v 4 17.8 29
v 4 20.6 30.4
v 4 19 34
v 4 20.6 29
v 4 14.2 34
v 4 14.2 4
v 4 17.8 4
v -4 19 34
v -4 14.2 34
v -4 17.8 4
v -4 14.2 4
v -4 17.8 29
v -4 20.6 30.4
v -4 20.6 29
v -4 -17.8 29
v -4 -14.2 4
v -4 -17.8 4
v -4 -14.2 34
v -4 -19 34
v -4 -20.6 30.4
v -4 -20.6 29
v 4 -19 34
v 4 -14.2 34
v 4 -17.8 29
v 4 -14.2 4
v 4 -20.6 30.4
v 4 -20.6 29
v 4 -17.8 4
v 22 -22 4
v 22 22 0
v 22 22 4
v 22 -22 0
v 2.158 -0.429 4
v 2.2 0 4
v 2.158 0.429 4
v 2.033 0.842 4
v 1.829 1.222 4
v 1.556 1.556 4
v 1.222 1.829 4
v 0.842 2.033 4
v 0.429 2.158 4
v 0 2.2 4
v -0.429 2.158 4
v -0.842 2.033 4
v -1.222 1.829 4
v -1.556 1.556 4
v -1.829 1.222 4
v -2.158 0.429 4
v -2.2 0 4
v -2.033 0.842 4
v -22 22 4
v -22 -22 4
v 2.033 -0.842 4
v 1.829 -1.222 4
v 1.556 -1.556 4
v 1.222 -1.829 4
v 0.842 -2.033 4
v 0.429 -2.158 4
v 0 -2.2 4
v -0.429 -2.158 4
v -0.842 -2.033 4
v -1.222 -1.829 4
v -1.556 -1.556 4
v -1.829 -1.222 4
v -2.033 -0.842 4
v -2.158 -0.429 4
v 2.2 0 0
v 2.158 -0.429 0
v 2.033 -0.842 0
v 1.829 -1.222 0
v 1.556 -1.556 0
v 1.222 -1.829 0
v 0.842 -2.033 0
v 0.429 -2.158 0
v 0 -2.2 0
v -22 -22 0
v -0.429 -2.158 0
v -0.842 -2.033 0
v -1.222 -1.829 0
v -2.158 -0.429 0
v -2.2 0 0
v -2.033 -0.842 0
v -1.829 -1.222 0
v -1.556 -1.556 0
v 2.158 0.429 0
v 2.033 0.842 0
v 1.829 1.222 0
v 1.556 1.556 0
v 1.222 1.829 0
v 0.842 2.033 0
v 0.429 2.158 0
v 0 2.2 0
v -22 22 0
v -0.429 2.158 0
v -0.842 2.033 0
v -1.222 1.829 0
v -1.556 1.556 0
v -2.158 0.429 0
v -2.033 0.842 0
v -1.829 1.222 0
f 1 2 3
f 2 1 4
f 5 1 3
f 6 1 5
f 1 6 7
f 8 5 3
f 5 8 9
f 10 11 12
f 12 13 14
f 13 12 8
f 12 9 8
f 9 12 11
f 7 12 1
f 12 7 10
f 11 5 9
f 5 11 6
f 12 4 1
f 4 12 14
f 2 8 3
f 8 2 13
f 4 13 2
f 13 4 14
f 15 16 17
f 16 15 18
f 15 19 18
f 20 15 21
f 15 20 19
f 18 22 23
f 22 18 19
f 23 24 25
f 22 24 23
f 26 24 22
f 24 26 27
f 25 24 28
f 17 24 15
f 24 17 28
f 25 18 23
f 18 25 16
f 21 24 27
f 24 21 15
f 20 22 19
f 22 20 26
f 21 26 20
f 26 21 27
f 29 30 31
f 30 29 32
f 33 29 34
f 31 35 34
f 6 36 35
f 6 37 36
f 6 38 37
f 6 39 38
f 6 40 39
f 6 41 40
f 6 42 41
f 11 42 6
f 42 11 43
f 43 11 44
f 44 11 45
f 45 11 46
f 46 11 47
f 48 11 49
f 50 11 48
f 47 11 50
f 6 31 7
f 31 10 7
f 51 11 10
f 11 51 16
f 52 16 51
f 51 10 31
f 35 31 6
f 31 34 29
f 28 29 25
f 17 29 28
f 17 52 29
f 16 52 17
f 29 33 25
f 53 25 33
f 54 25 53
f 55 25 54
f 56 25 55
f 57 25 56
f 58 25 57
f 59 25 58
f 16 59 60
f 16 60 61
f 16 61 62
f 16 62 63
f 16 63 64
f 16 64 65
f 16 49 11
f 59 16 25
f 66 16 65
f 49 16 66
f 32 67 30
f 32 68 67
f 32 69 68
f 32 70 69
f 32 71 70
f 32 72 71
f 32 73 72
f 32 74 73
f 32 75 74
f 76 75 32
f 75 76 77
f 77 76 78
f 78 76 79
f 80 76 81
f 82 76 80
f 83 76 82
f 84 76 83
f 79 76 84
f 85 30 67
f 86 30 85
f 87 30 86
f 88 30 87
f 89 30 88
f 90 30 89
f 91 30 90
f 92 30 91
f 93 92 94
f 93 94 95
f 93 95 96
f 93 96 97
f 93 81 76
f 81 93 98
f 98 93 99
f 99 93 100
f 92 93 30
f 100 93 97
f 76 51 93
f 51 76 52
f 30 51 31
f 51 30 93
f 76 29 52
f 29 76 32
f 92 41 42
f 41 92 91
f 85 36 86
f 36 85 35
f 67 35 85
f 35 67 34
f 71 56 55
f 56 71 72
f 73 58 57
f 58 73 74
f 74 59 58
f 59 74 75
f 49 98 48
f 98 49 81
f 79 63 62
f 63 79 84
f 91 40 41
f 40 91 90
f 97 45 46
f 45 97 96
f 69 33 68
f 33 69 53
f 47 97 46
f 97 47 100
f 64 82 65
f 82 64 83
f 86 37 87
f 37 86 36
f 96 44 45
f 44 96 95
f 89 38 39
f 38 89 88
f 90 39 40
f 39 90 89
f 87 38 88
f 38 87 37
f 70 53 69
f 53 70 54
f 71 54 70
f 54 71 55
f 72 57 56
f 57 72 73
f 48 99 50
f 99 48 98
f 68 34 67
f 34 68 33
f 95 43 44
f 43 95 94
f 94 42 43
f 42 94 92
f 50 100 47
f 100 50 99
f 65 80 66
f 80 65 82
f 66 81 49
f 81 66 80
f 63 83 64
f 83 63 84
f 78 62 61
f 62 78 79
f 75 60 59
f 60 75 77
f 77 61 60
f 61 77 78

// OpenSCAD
$fn = 32;

// ----------------------------------------------------------------------
// Snap-fit latch: 2 arms, 30 mm tall, 3 mm undercut hooks
// ----------------------------------------------------------------------

// --- parameters (mm) ---
base_d = 44;              // base plate depth
base_h = 4;               // base plate thickness
span = 32;                // distance between opposite arms
arm_t = 3.6;              // arm thickness
arm_d = 8;                // arm width
height = 30;              // free arm length
head_len = 3;             // hook reach
head_h = 5;               // hook height
lead = 1.4;               // lead-in ramp thickness
bore_d = 4.4;             // base fixing bore
top_z = 34;               // height of the arm tips above the base

arms = 2;

difference() {
  union() {
    /* base plate, centred on the arm ring */
    translate([-22, -22, 0]) cube([base_d, base_d, base_h]);
    for (a = [0 : 360 / arms : 359]) rotate([0, 0, a]) {
    /* arm, sunk 0.5 mm into the base */
    translate([-arm_d / 2, span / 2 - arm_t / 2, base_h - 0.5]) cube([arm_d, arm_t, height + 0.5]);
    /* hook: a convex hull of a tall inner block and a thin outer lip
       gives a flat undercut below and a lead-in ramp on top */
    hull() {
      translate([-arm_d / 2, span / 2 + arm_t / 2 - 0.6, top_z - head_h]) cube([arm_d, lead + 0.4, head_h]);
      translate([-arm_d / 2, span / 2 + arm_t / 2 - 0.2, top_z - head_h]) cube([arm_d, head_len, lead]);
    }
    }
  }
  translate([0, 0, -2.5]) cylinder(h = base_h + 5, d = bore_d);
}
